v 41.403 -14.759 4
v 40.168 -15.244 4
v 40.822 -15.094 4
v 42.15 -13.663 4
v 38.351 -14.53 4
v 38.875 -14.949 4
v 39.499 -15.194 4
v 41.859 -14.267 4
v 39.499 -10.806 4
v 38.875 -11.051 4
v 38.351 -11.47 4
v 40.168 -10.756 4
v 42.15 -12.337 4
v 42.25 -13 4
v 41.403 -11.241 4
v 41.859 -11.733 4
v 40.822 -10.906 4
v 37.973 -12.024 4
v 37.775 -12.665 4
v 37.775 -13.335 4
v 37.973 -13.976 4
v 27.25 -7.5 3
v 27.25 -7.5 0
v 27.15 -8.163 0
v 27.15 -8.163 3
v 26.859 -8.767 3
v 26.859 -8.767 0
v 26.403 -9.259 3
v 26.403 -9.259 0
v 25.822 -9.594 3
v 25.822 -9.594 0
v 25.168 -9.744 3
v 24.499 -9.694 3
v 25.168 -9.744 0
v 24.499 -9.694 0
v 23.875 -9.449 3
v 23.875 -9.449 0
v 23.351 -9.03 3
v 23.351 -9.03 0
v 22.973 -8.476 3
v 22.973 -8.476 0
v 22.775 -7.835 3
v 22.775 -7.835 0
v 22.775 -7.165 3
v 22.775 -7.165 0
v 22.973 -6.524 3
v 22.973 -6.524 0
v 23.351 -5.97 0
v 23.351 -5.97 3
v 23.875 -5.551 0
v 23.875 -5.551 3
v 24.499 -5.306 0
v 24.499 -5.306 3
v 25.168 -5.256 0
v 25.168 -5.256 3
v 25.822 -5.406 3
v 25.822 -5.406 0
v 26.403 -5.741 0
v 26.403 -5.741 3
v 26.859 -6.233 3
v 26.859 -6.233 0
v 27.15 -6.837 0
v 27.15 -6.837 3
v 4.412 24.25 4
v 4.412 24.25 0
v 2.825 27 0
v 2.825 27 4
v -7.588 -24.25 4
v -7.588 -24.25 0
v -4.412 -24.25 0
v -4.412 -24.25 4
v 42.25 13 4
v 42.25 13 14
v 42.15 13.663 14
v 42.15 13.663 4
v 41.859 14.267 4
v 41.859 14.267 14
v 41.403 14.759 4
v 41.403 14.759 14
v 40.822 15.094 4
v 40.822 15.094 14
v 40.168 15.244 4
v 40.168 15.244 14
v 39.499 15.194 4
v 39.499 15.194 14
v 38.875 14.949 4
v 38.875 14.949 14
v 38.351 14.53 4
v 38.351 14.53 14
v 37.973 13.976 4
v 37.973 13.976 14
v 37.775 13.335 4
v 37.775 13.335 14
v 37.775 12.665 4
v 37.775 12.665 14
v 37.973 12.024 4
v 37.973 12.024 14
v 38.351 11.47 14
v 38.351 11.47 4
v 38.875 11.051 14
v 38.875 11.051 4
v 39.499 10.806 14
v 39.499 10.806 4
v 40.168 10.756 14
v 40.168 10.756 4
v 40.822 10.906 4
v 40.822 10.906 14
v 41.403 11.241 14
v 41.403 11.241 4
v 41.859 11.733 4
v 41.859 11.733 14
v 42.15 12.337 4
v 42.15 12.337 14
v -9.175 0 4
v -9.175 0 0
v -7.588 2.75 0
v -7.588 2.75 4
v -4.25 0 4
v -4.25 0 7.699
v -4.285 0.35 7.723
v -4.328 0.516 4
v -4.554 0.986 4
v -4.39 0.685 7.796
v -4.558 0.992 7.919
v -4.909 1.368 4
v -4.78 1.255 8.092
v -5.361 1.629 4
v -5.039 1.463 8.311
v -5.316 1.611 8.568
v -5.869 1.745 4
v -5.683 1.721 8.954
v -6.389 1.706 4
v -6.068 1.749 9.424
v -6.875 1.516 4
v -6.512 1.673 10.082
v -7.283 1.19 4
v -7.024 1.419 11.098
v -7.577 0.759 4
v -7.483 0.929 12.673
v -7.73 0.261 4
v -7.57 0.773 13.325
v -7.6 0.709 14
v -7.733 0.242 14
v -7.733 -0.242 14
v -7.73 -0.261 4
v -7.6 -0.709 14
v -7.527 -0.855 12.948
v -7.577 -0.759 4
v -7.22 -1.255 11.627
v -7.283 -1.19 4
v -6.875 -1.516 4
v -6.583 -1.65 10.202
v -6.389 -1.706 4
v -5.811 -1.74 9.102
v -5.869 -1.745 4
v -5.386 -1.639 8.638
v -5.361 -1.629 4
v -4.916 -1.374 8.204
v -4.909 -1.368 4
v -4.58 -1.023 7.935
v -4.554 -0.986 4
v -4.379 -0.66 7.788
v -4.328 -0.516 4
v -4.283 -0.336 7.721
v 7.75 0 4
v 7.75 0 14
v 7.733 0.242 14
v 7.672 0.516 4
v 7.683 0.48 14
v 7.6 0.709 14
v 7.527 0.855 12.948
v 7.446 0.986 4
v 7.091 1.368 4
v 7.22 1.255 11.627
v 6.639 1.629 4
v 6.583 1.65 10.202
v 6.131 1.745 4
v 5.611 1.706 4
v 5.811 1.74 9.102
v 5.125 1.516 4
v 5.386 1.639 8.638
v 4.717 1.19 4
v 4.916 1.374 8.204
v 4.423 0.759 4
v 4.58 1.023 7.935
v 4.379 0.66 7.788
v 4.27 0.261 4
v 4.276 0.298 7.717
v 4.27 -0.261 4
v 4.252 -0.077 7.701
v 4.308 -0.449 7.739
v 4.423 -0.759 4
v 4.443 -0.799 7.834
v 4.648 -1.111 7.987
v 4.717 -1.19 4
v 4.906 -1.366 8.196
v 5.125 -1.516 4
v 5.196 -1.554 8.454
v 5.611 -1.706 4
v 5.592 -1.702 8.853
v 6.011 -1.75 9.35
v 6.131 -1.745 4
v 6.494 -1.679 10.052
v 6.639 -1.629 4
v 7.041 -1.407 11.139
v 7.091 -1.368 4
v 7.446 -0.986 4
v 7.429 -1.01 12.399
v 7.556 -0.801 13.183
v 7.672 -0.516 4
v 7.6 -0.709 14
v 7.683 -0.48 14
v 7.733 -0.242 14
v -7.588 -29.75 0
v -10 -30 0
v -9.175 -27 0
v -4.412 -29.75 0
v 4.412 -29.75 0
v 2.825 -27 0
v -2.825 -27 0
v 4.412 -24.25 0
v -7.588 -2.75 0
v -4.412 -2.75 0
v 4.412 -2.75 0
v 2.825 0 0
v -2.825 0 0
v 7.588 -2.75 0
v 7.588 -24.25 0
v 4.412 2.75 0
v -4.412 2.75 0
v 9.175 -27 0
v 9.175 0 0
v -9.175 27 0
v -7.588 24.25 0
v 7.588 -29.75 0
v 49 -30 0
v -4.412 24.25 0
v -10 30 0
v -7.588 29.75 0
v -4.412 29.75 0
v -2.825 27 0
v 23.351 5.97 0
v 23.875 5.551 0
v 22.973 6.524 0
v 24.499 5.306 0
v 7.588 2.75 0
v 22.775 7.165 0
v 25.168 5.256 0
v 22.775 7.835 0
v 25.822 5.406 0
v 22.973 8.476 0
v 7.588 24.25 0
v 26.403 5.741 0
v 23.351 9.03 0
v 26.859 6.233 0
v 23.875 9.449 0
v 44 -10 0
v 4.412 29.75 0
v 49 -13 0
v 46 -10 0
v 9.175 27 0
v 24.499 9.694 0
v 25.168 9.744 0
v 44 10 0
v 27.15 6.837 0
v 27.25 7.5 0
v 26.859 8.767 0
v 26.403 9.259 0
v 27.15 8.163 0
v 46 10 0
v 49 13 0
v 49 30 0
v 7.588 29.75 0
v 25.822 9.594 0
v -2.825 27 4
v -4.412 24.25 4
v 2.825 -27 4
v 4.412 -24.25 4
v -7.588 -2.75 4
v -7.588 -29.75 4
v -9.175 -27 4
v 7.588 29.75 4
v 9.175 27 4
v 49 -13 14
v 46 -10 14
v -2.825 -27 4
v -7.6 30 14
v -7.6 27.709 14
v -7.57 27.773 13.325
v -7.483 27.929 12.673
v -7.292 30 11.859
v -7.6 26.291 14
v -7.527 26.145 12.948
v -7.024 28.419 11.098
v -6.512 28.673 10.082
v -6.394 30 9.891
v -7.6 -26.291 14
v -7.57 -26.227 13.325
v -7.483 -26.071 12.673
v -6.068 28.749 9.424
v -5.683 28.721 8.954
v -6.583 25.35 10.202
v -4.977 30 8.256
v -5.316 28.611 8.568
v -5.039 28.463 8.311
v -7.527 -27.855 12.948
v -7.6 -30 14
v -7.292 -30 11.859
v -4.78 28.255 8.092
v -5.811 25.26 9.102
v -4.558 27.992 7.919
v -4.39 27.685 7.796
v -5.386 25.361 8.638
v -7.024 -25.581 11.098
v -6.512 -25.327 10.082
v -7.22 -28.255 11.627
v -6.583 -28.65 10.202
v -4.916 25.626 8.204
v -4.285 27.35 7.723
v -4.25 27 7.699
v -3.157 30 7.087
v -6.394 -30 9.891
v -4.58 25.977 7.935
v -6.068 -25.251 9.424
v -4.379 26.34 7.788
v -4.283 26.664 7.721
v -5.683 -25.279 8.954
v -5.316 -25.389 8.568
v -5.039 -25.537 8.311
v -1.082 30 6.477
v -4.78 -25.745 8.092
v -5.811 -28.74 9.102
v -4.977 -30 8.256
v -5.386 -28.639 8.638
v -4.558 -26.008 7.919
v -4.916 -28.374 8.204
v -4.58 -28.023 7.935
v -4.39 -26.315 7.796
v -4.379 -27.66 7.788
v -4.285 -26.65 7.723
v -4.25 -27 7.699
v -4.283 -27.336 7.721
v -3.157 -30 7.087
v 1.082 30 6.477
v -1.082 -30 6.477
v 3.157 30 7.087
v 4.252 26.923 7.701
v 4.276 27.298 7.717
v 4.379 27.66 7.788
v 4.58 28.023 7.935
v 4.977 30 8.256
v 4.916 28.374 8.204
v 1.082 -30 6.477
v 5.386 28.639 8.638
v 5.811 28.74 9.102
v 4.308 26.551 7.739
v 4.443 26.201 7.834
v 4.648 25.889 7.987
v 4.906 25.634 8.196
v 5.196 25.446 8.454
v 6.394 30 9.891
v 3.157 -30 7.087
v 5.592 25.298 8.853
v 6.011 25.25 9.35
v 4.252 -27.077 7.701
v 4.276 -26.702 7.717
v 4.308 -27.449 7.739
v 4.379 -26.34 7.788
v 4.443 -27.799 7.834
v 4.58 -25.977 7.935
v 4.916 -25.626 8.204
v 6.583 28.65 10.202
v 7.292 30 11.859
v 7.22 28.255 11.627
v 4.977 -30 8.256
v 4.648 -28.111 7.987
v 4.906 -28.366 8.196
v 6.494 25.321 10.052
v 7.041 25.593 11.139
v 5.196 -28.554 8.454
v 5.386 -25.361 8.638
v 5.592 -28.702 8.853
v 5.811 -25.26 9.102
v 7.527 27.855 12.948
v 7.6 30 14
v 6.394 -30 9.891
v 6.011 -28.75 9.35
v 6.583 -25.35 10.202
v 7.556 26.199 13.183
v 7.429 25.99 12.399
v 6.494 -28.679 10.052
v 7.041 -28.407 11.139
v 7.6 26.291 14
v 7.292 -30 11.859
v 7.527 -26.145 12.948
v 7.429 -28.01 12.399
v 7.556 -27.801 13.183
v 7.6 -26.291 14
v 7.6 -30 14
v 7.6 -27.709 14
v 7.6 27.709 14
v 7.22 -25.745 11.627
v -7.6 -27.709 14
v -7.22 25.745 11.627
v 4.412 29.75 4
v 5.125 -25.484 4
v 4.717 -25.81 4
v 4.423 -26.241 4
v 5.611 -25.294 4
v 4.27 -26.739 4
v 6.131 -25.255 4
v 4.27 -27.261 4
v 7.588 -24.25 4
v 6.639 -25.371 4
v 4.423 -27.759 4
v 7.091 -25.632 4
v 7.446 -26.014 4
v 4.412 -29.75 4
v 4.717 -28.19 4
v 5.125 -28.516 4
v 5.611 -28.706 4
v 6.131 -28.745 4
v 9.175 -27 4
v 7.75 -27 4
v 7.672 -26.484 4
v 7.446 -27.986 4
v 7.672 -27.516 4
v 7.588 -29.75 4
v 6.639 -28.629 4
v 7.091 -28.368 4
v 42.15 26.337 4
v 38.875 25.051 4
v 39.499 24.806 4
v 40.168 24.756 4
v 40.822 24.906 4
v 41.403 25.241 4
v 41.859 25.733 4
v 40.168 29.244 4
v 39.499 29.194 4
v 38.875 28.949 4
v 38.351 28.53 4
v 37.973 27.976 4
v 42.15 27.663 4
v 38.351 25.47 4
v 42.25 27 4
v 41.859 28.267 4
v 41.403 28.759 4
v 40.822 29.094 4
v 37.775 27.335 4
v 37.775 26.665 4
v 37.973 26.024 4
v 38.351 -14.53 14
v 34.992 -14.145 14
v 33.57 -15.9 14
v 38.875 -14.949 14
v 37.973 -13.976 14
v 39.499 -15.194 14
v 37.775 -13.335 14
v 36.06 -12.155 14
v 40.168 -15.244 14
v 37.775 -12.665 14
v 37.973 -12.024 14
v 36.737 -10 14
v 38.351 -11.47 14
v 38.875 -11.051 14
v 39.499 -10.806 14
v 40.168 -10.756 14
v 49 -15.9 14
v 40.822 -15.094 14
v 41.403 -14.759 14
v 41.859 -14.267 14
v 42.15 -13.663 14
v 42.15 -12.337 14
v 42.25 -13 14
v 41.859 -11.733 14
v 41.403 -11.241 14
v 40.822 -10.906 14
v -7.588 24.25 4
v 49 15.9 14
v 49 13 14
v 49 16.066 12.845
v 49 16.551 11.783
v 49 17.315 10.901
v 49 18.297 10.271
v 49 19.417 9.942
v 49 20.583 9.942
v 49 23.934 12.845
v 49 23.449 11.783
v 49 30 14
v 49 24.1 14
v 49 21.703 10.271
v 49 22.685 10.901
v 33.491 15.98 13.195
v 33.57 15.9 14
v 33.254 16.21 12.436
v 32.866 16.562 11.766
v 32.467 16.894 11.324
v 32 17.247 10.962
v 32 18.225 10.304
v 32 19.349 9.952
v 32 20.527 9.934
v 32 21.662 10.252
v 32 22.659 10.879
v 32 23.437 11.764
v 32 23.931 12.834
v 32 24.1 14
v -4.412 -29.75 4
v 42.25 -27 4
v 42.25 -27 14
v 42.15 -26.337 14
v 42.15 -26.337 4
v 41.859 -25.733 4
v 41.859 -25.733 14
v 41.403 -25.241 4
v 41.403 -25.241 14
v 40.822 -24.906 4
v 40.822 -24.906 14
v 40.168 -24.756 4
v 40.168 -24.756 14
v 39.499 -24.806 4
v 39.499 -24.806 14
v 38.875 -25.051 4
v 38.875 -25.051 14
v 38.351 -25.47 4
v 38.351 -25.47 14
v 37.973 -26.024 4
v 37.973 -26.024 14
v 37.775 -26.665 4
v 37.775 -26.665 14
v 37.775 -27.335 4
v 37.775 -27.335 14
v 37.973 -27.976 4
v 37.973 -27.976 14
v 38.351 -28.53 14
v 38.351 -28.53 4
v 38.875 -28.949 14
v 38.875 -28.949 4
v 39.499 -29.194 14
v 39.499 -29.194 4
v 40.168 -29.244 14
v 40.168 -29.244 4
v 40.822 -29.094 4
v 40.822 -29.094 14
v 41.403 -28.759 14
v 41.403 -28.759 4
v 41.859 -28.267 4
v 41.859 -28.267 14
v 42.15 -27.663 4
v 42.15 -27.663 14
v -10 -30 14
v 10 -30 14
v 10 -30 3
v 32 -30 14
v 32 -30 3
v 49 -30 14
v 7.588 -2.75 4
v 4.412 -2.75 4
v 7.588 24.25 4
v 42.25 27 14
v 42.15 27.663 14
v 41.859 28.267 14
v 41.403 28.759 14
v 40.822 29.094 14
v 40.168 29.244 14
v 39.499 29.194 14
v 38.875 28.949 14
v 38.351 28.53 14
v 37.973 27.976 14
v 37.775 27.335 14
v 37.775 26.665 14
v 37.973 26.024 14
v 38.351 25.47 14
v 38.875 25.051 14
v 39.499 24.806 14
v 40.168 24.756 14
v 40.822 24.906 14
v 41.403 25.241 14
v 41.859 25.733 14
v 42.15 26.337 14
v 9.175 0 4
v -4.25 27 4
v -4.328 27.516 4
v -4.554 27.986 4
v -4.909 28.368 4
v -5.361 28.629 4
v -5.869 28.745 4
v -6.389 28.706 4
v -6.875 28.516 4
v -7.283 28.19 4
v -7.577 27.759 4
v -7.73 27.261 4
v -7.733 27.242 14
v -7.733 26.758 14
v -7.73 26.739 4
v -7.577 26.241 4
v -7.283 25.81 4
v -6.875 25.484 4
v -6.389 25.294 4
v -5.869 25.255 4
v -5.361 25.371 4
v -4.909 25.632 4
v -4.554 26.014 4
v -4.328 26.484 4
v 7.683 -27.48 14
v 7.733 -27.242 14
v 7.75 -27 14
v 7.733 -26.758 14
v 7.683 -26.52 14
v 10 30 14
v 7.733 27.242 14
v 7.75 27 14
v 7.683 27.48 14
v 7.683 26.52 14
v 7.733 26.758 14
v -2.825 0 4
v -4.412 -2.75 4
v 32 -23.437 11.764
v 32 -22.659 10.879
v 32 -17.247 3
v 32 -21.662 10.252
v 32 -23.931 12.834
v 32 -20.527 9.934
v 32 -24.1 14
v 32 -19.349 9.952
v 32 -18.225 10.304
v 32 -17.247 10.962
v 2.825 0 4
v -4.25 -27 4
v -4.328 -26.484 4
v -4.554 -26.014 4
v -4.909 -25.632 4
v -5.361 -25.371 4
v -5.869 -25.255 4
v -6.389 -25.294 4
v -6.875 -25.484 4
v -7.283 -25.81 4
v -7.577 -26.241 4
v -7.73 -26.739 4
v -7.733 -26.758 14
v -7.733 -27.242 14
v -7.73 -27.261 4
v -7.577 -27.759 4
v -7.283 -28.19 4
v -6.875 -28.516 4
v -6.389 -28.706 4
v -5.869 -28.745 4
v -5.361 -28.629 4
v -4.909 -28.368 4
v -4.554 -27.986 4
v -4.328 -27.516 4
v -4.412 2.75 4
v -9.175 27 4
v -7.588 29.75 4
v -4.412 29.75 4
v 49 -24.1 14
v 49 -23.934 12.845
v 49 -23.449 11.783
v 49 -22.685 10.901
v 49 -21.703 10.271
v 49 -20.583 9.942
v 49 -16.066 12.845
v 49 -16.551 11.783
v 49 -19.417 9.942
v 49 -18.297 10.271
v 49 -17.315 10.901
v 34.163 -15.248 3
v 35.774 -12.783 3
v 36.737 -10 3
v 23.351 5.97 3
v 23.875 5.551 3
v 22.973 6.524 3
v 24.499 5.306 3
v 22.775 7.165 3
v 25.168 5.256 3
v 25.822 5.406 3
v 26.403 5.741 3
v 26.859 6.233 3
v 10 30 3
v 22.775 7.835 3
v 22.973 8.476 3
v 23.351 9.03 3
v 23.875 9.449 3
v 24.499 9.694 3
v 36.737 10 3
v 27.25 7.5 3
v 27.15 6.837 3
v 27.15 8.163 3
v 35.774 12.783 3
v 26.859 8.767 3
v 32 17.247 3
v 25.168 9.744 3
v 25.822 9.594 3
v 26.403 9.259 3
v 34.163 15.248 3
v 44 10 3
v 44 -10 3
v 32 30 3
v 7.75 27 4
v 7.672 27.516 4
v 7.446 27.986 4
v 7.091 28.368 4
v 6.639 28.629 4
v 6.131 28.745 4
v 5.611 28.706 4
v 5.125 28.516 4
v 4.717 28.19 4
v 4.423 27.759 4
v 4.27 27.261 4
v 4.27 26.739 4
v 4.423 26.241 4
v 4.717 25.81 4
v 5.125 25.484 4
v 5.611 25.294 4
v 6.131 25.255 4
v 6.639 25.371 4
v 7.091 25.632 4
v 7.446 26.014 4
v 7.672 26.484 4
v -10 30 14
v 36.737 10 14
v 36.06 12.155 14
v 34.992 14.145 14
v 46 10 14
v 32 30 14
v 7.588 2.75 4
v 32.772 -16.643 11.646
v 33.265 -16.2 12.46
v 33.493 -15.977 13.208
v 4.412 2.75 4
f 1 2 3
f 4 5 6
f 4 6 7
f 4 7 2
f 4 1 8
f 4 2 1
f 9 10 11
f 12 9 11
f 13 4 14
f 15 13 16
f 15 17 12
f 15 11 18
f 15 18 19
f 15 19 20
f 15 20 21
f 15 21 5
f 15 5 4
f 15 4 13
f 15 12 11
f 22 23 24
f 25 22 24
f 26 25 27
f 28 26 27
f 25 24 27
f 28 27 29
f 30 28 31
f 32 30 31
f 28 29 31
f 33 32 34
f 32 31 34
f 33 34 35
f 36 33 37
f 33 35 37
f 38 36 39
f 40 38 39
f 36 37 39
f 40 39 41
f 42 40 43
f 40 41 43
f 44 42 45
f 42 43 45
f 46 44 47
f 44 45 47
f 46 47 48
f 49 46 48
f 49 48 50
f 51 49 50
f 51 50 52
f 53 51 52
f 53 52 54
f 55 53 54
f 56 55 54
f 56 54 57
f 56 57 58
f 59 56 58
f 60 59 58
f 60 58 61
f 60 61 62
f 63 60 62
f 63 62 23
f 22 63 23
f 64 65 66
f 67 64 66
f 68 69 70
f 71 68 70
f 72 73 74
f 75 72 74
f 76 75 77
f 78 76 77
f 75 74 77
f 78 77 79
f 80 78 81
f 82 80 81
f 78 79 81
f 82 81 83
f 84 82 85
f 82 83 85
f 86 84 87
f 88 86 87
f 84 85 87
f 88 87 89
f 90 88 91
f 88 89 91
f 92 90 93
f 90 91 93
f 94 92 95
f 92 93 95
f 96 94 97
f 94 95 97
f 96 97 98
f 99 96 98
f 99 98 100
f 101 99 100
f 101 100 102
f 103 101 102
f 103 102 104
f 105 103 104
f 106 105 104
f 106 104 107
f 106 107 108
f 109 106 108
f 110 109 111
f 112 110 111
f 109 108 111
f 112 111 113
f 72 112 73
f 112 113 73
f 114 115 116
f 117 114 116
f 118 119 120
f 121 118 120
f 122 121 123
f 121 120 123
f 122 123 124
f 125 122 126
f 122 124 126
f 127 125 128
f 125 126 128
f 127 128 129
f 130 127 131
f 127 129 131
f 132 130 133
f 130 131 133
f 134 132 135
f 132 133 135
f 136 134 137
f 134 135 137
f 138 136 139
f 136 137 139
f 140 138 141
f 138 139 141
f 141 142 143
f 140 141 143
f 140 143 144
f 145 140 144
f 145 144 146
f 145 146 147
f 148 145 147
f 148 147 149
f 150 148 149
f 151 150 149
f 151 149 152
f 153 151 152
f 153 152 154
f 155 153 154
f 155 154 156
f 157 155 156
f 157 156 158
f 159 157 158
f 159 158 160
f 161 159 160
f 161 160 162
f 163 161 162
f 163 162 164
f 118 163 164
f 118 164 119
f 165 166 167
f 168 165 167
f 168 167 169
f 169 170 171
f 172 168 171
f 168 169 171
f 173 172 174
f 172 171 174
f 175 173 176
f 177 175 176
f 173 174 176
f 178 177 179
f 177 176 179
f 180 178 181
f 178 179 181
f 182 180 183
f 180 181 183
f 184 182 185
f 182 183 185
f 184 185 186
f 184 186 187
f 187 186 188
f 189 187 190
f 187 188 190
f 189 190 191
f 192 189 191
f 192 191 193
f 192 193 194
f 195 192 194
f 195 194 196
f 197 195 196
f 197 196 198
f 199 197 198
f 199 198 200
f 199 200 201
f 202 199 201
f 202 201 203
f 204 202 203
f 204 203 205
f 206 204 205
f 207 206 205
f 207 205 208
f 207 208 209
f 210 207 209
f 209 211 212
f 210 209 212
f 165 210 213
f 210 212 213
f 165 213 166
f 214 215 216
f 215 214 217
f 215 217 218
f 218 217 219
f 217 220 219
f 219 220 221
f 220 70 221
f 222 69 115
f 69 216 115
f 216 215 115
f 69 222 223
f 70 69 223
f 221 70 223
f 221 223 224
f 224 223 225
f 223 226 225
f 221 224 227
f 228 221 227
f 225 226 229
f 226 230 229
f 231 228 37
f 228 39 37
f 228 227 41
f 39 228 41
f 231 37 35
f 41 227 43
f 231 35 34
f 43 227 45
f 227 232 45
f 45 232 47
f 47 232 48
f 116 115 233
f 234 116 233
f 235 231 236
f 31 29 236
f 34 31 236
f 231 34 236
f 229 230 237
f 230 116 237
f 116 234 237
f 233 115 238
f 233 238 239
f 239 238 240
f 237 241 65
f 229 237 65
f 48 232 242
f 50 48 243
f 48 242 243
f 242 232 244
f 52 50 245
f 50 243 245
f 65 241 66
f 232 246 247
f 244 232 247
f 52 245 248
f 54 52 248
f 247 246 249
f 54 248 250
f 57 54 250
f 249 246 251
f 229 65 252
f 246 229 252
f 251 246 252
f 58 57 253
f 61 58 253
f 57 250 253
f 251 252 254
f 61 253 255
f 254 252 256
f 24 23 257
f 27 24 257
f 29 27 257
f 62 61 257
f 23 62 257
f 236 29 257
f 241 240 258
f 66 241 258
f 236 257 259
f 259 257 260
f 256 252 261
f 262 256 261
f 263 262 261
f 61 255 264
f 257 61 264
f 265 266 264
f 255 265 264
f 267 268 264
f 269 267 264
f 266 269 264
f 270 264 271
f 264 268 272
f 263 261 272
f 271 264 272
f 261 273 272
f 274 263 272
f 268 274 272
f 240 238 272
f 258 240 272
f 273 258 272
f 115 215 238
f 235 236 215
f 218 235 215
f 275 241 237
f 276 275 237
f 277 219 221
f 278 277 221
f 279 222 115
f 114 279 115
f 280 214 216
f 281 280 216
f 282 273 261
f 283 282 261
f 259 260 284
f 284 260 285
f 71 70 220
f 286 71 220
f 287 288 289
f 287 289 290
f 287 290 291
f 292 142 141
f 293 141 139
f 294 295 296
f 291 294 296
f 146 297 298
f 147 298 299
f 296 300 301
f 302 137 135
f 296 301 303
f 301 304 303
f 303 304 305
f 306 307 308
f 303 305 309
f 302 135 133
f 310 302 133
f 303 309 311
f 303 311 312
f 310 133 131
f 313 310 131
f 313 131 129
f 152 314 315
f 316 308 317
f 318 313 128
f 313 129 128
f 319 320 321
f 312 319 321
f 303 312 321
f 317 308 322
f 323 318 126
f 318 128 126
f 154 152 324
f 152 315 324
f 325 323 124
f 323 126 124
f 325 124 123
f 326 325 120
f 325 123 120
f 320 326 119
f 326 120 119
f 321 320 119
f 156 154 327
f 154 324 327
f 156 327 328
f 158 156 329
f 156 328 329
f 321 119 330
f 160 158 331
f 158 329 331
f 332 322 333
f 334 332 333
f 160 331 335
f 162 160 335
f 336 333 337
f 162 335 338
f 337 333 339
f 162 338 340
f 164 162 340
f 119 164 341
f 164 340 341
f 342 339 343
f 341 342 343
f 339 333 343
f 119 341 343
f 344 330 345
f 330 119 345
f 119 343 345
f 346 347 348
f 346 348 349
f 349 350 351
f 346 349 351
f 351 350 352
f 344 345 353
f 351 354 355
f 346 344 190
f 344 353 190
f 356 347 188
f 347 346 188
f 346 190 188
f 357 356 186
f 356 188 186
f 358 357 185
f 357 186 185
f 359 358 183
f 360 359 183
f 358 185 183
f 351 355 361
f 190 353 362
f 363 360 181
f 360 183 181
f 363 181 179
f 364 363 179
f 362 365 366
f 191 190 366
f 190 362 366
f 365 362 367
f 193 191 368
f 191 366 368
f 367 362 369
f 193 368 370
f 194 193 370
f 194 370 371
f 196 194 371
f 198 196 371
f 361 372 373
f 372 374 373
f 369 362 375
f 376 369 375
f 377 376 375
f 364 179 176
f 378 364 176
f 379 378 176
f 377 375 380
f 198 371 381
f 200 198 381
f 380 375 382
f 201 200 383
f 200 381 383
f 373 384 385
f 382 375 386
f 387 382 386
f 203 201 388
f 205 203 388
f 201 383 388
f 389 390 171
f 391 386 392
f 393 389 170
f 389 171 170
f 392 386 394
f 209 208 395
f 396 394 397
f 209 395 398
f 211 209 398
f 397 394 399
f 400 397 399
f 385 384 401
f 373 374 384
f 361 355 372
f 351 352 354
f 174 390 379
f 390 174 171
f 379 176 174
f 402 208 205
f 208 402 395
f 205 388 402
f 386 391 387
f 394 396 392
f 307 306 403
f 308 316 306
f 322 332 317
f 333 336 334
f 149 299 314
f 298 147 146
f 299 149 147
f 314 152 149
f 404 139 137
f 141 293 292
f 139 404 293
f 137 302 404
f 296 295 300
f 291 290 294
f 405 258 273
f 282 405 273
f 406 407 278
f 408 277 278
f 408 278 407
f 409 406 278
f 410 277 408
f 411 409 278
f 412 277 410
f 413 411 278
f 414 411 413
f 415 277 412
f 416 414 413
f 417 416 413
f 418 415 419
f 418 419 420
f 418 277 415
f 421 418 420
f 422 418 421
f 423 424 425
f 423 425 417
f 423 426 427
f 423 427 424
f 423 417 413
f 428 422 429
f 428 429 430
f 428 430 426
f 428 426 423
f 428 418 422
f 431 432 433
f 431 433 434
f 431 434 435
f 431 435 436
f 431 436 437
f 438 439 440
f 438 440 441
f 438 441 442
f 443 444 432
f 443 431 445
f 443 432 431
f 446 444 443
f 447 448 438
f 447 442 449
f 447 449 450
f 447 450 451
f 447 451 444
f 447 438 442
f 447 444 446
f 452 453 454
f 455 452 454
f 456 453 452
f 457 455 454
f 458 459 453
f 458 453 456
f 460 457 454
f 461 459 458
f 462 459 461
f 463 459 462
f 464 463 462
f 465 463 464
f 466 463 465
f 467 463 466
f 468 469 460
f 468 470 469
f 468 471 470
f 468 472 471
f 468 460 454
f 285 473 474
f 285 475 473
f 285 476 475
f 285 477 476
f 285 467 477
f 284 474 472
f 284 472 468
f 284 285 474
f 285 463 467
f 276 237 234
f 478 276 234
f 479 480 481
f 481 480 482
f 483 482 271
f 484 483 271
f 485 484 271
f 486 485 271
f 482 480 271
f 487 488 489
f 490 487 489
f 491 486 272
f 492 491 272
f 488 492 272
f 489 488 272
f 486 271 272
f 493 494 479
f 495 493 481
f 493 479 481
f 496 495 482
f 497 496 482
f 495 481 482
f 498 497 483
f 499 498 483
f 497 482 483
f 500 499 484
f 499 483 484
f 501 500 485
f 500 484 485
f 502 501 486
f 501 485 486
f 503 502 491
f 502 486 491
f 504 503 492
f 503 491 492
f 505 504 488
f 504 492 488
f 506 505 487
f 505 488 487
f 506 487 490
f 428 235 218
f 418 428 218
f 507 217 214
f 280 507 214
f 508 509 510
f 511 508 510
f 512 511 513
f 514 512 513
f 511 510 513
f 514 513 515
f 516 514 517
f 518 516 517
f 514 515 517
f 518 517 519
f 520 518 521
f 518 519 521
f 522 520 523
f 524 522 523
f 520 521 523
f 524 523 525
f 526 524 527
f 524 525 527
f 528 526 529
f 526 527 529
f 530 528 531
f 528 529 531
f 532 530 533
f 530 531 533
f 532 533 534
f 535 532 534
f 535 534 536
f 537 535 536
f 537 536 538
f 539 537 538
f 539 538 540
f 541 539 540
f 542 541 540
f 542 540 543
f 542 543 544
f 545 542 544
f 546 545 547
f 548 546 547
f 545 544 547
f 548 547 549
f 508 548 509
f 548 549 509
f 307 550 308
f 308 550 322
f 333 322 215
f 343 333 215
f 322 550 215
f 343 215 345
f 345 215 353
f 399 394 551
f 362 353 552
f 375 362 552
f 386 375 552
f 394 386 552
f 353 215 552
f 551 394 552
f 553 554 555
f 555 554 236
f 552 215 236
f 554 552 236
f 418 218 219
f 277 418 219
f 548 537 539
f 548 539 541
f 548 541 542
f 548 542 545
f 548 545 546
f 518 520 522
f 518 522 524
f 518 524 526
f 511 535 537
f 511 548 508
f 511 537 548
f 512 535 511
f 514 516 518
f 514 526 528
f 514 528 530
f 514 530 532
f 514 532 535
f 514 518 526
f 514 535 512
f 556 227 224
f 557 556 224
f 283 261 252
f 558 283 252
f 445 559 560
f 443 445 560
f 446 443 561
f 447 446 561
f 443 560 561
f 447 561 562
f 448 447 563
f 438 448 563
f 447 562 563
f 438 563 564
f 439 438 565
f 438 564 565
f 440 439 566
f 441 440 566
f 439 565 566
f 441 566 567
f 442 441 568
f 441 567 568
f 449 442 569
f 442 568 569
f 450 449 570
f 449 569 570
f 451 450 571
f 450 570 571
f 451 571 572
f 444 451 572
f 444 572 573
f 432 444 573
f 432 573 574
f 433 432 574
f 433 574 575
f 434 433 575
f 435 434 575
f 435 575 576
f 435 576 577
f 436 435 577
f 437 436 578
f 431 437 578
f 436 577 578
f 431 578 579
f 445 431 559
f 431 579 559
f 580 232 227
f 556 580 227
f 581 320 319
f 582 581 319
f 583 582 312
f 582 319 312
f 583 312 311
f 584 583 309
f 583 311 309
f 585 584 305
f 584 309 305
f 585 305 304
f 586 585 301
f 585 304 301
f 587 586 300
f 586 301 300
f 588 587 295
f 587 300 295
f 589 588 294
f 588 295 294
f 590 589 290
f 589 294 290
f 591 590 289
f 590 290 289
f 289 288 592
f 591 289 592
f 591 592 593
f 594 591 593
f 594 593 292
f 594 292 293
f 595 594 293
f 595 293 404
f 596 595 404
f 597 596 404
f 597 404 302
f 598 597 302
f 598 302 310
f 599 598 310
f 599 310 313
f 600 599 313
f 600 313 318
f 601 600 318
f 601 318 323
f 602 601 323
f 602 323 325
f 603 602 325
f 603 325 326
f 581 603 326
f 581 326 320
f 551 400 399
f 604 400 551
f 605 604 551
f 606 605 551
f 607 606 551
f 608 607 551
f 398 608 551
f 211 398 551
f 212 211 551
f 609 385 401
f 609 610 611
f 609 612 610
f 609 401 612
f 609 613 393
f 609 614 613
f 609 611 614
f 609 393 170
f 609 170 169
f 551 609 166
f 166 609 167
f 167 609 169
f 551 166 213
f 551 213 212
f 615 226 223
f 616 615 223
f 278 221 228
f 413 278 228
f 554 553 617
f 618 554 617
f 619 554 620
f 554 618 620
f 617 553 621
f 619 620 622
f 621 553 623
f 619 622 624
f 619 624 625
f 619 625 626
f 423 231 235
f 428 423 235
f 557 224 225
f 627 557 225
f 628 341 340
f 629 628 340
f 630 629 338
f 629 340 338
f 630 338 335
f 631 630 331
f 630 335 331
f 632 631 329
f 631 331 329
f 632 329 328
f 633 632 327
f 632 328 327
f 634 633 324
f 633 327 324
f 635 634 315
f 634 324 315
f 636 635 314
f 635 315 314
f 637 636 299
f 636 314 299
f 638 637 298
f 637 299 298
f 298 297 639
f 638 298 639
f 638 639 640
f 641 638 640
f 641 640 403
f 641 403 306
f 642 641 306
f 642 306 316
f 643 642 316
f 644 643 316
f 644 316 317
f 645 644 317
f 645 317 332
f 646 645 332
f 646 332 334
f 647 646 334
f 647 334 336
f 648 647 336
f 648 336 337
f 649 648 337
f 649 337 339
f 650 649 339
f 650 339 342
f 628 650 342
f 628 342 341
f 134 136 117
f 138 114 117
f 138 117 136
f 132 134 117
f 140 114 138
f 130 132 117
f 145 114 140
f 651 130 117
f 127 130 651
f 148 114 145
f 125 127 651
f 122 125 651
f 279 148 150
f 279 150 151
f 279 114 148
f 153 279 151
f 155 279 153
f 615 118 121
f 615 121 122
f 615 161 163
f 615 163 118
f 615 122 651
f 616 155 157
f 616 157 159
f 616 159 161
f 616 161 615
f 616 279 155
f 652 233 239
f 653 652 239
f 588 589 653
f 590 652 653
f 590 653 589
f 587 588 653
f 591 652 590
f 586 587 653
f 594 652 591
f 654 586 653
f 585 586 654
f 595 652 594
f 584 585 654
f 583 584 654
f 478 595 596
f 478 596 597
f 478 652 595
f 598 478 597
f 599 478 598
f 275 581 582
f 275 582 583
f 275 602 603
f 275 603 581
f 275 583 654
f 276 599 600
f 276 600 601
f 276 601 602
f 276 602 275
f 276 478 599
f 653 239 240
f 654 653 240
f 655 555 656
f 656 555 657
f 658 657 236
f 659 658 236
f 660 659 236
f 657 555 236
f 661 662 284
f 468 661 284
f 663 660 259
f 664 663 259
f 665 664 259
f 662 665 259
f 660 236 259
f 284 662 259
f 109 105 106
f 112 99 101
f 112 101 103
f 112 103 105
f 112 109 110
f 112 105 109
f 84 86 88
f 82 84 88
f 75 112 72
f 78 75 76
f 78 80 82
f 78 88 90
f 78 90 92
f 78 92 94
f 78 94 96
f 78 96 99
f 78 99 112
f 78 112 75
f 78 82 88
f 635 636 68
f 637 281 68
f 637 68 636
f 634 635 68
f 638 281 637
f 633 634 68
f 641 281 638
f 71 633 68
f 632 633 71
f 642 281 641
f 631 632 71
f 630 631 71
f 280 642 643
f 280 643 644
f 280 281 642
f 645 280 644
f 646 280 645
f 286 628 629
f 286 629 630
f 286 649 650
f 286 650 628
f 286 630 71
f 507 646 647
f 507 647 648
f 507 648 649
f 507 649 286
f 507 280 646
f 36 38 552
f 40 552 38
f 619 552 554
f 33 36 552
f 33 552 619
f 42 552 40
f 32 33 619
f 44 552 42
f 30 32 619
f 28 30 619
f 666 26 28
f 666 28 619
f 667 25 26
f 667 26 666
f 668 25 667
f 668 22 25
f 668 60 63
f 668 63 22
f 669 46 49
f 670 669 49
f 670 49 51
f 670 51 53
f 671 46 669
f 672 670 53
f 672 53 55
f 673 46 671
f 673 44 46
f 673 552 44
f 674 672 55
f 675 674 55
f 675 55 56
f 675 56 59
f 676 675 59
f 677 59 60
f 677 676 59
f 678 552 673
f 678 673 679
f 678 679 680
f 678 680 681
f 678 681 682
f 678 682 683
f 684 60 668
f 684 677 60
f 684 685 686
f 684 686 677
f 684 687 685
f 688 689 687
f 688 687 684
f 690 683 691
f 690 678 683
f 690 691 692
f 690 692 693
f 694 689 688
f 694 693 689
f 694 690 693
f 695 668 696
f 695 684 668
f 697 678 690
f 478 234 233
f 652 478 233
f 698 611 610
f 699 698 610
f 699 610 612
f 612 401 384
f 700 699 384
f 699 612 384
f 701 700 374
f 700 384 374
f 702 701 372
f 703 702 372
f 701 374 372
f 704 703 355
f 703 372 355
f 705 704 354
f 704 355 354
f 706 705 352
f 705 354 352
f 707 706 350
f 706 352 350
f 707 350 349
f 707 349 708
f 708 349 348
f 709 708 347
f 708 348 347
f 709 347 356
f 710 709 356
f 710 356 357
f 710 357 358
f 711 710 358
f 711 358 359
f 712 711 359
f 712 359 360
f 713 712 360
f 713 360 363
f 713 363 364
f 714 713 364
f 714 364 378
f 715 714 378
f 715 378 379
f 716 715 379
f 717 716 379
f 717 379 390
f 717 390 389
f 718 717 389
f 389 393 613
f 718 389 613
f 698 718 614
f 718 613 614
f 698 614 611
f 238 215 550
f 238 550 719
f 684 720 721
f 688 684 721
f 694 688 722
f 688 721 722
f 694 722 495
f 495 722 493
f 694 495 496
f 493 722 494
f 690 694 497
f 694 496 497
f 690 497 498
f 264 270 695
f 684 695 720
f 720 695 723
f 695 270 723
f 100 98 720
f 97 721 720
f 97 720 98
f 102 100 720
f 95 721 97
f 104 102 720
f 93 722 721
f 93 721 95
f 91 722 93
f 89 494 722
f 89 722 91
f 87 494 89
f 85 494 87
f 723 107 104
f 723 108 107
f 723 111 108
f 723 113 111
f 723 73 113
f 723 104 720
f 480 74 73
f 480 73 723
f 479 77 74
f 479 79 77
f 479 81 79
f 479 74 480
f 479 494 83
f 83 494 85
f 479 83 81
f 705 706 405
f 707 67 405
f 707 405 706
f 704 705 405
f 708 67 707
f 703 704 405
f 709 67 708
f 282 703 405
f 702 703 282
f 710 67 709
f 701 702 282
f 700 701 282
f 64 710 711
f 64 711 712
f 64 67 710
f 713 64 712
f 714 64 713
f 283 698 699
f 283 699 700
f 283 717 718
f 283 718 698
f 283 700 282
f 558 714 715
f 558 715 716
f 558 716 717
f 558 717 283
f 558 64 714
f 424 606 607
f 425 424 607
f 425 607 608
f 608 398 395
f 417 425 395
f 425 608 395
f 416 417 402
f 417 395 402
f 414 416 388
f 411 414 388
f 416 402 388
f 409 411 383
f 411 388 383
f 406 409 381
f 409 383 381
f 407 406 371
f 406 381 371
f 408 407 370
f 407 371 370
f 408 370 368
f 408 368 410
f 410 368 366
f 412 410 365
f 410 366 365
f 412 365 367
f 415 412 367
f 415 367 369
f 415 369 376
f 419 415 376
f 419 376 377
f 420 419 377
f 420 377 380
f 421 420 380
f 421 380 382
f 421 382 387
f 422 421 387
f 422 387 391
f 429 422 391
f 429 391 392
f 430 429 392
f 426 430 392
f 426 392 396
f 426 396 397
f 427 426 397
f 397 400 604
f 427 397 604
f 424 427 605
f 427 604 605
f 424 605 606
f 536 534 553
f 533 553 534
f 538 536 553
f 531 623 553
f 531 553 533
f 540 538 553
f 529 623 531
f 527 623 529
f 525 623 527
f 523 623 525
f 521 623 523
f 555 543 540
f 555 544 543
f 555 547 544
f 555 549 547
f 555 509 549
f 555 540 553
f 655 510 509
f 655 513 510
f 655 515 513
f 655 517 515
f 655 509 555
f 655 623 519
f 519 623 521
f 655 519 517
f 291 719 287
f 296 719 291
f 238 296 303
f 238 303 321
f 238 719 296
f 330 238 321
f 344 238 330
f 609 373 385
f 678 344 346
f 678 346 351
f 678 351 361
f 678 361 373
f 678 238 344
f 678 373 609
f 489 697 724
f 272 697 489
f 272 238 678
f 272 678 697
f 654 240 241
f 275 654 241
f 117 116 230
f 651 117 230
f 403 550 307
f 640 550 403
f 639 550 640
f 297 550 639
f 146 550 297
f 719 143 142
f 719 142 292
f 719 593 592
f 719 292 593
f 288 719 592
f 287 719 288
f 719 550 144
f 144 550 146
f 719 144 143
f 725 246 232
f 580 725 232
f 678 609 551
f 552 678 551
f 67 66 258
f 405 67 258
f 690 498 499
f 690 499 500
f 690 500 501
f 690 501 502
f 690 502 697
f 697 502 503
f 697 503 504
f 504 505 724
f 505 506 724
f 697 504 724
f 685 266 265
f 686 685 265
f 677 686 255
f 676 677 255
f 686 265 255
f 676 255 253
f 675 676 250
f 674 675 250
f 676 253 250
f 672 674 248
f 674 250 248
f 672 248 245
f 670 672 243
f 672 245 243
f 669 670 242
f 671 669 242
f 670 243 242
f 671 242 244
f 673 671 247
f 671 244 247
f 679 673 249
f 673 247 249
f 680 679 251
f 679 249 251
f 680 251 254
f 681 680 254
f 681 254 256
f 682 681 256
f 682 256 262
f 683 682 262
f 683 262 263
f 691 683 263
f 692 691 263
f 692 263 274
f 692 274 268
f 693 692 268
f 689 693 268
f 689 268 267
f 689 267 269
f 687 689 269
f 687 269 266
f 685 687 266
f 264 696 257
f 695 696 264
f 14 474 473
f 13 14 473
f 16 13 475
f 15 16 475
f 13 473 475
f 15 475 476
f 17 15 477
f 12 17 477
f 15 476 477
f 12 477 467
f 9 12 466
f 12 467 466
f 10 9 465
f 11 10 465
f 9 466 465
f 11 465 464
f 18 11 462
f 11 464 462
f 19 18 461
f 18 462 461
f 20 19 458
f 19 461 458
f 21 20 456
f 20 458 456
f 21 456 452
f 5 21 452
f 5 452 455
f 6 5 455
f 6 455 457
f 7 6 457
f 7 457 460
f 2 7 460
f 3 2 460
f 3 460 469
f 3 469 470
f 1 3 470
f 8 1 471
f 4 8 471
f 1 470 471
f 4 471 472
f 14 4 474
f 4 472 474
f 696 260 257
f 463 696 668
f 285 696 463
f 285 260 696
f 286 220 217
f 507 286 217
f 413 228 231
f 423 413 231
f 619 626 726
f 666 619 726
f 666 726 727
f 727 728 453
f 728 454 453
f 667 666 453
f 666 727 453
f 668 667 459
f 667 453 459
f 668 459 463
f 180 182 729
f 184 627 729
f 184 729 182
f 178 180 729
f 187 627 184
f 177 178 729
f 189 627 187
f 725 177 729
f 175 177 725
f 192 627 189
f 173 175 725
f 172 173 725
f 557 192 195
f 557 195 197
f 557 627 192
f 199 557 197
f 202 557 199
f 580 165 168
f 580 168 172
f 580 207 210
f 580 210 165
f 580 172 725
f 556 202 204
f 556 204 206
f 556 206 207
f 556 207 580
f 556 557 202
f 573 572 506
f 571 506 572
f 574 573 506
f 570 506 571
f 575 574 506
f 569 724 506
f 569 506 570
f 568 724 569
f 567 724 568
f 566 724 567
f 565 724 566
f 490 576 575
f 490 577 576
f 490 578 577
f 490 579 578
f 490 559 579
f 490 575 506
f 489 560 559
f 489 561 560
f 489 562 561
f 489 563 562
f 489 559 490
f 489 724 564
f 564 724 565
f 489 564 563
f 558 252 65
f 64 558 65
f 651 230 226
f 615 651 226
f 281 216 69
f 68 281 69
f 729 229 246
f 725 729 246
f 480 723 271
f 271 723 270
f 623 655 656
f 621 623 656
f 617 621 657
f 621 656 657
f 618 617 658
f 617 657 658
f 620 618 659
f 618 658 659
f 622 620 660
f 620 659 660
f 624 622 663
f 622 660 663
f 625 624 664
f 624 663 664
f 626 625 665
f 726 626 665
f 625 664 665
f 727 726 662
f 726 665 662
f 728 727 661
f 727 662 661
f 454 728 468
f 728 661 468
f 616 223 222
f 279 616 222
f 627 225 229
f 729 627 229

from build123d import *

# Parameters (mm, degrees)
SKETCH_W        = 59
SKETCH_H        = 60
PAD_DEPTH       = 14
SKETCH001_R     = 7.6
POCKET_DEPTH    = 60.001
SKETCH002_R     = 1.75
POCKET001_DEPTH = 14.001
POCKET002_DEPTH = 11
SKETCH004_R     = 2.25
POCKET003_DEPTH = 14.001
SKETCH008_R     = 4.1
POCKET005_DEPTH = 20
SKETCH010_W     = 20
SKETCH010_H     = 25
POCKET006_DEPTH = 5
SKETCH011_R     = 2.25
POCKET007_DEPTH = 10
CHAMFER_SIZE    = 3
POCKET008_DEPTH = 4


with BuildPart() as part:
    # Sketch → Pad (new body)
    with BuildSketch(Plane.XY):
        with Locations((19.5, 0)):
            Rectangle(SKETCH_W, SKETCH_H)
    extrude(amount=PAD_DEPTH)

    # Sketch001 → Pocket (cut, through all)
    with BuildSketch(Plane.XZ.offset(30)):
        with Locations((0, 14)):
            Circle(SKETCH001_R)
    extrude(amount=-POCKET_DEPTH, mode=Mode.SUBTRACT)

    # Sketch002 → Pocket001 (cut, through all)
    with BuildSketch(Plane.XY.offset(14)):
        with Locations((-6, 27)):
            Circle(SKETCH002_R)
        with Locations((-6, -27)):
            Circle(SKETCH002_R)
        with Locations((6, 27)):
            Circle(SKETCH002_R)
        with Locations((6, -27)):
            Circle(SKETCH002_R)
        with Locations((6, 0)):
            Circle(SKETCH002_R)
        with Locations((-6, 0)):
            Circle(SKETCH002_R)
    extrude(amount=-POCKET001_DEPTH, mode=Mode.SUBTRACT)

    # Sketch003 → Pocket002 (cut)
    with BuildSketch(Plane.XY.offset(14)):
        with BuildLine():
            Line((10, 35), (10, -35))
            Line((10, -35), (32, -35))
            Line((32, -35), (32, -17.246794))
            ThreePointArc((32, -17.246794), (35.044647, -14.065445), (36.736695, -10))
            Line((36.736695, -10), (56.736695, -10))
            Line((56.736695, -10), (56.736695, 10))
            Line((56.736695, 10), (36.736695, 10))
            ThreePointArc((36.736695, 10), (35.044647, 14.065445), (32, 17.246794))
            Line((32, 17.246794), (32, 35))
            Line((32, 35), (10, 35))
        make_face()
    extrude(amount=-POCKET002_DEPTH, mode=Mode.SUBTRACT)

    # Sketch004 → Pocket003 (cut, through all)
    with BuildSketch(Plane(origin=(0, 0, 0), x_dir=(1, 0, 0), z_dir=(0, 0, -1))):
        with Locations((25, 7.5)):
            Circle(SKETCH004_R)
        with Locations((25, -7.5)):
            Circle(SKETCH004_R)
    extrude(amount=-POCKET003_DEPTH, mode=Mode.SUBTRACT)

    # Sketch008 → Pocket005 (cut)
    with BuildSketch(Plane.YZ.offset(49)):
        with Locations((-20, 14)):
            Circle(SKETCH008_R)
        with Locations((20, 14)):
            Circle(SKETCH008_R)
    extrude(amount=-POCKET005_DEPTH, mode=Mode.SUBTRACT)

    # Sketch010 → Pocket006 (cut)
    with BuildSketch(Plane.YZ.offset(49)):
        with Locations((0, 6.5)):
            Rectangle(SKETCH010_W, SKETCH010_H)
    extrude(amount=-POCKET006_DEPTH, mode=Mode.SUBTRACT)

    # Sketch011 → Pocket007 (cut)
    with BuildSketch(Plane.XY.offset(14)):
        with Locations((40, 27)):
            Circle(SKETCH011_R)
        with Locations((40, 13)):
            Circle(SKETCH011_R)
        with Locations((40, -13)):
            Circle(SKETCH011_R)
        with Locations((40, -27)):
            Circle(SKETCH011_R)
    extrude(amount=-POCKET007_DEPTH, mode=Mode.SUBTRACT)

    # Chamfer
    chamfer_edges = [part.edges().sort_by_distance(p)[0] for p in [
        (49, -10, 8.5),
        (49, 10, 8.5),
    ]]
    chamfer(chamfer_edges, length=CHAMFER_SIZE)

    # Sketch012 → Pocket008 (cut)
    with BuildSketch(Plane(origin=(0, 0, 0), x_dir=(1, 0, 0), z_dir=(0, 0, -1))):
        Polygon((-4.412285, 29.750003), (-7.587715, 29.750003), (-9.17543, 27), (-7.587715, 24.249997), (-4.412285, 24.249997), (-2.82457, 27), align=None)
        Polygon((7.587715, 29.750003), (4.412285, 29.750003), (2.82457, 27), (4.412285, 24.249997), (7.587715, 24.249997), (9.17543, 27), align=None)
        Polygon((-4.412285, 2.750003), (-7.587715, 2.750003), (-9.17543, 0), (-7.587715, -2.750003), (-4.412285, -2.750003), (-2.82457, 0), align=None)
        Polygon((7.587715, 2.750003), (4.412285, 2.750003), (2.82457, 0), (4.412285, -2.750003), (7.587715, -2.750003), (9.17543, 0), align=None)
        Polygon((-4.412285, -24.249997), (-7.587715, -24.249997), (-9.17543, -27), (-7.587715, -29.750003), (-4.412285, -29.750003), (-2.82457, -27), align=None)
        Polygon((7.587715, -24.249997), (4.412285, -24.249997), (2.82457, -27), (4.412285, -29.750003), (7.587715, -29.750003), (9.17543, -27), align=None)
    extrude(amount=-POCKET008_DEPTH, mode=Mode.SUBTRACT)


solid = part.part
